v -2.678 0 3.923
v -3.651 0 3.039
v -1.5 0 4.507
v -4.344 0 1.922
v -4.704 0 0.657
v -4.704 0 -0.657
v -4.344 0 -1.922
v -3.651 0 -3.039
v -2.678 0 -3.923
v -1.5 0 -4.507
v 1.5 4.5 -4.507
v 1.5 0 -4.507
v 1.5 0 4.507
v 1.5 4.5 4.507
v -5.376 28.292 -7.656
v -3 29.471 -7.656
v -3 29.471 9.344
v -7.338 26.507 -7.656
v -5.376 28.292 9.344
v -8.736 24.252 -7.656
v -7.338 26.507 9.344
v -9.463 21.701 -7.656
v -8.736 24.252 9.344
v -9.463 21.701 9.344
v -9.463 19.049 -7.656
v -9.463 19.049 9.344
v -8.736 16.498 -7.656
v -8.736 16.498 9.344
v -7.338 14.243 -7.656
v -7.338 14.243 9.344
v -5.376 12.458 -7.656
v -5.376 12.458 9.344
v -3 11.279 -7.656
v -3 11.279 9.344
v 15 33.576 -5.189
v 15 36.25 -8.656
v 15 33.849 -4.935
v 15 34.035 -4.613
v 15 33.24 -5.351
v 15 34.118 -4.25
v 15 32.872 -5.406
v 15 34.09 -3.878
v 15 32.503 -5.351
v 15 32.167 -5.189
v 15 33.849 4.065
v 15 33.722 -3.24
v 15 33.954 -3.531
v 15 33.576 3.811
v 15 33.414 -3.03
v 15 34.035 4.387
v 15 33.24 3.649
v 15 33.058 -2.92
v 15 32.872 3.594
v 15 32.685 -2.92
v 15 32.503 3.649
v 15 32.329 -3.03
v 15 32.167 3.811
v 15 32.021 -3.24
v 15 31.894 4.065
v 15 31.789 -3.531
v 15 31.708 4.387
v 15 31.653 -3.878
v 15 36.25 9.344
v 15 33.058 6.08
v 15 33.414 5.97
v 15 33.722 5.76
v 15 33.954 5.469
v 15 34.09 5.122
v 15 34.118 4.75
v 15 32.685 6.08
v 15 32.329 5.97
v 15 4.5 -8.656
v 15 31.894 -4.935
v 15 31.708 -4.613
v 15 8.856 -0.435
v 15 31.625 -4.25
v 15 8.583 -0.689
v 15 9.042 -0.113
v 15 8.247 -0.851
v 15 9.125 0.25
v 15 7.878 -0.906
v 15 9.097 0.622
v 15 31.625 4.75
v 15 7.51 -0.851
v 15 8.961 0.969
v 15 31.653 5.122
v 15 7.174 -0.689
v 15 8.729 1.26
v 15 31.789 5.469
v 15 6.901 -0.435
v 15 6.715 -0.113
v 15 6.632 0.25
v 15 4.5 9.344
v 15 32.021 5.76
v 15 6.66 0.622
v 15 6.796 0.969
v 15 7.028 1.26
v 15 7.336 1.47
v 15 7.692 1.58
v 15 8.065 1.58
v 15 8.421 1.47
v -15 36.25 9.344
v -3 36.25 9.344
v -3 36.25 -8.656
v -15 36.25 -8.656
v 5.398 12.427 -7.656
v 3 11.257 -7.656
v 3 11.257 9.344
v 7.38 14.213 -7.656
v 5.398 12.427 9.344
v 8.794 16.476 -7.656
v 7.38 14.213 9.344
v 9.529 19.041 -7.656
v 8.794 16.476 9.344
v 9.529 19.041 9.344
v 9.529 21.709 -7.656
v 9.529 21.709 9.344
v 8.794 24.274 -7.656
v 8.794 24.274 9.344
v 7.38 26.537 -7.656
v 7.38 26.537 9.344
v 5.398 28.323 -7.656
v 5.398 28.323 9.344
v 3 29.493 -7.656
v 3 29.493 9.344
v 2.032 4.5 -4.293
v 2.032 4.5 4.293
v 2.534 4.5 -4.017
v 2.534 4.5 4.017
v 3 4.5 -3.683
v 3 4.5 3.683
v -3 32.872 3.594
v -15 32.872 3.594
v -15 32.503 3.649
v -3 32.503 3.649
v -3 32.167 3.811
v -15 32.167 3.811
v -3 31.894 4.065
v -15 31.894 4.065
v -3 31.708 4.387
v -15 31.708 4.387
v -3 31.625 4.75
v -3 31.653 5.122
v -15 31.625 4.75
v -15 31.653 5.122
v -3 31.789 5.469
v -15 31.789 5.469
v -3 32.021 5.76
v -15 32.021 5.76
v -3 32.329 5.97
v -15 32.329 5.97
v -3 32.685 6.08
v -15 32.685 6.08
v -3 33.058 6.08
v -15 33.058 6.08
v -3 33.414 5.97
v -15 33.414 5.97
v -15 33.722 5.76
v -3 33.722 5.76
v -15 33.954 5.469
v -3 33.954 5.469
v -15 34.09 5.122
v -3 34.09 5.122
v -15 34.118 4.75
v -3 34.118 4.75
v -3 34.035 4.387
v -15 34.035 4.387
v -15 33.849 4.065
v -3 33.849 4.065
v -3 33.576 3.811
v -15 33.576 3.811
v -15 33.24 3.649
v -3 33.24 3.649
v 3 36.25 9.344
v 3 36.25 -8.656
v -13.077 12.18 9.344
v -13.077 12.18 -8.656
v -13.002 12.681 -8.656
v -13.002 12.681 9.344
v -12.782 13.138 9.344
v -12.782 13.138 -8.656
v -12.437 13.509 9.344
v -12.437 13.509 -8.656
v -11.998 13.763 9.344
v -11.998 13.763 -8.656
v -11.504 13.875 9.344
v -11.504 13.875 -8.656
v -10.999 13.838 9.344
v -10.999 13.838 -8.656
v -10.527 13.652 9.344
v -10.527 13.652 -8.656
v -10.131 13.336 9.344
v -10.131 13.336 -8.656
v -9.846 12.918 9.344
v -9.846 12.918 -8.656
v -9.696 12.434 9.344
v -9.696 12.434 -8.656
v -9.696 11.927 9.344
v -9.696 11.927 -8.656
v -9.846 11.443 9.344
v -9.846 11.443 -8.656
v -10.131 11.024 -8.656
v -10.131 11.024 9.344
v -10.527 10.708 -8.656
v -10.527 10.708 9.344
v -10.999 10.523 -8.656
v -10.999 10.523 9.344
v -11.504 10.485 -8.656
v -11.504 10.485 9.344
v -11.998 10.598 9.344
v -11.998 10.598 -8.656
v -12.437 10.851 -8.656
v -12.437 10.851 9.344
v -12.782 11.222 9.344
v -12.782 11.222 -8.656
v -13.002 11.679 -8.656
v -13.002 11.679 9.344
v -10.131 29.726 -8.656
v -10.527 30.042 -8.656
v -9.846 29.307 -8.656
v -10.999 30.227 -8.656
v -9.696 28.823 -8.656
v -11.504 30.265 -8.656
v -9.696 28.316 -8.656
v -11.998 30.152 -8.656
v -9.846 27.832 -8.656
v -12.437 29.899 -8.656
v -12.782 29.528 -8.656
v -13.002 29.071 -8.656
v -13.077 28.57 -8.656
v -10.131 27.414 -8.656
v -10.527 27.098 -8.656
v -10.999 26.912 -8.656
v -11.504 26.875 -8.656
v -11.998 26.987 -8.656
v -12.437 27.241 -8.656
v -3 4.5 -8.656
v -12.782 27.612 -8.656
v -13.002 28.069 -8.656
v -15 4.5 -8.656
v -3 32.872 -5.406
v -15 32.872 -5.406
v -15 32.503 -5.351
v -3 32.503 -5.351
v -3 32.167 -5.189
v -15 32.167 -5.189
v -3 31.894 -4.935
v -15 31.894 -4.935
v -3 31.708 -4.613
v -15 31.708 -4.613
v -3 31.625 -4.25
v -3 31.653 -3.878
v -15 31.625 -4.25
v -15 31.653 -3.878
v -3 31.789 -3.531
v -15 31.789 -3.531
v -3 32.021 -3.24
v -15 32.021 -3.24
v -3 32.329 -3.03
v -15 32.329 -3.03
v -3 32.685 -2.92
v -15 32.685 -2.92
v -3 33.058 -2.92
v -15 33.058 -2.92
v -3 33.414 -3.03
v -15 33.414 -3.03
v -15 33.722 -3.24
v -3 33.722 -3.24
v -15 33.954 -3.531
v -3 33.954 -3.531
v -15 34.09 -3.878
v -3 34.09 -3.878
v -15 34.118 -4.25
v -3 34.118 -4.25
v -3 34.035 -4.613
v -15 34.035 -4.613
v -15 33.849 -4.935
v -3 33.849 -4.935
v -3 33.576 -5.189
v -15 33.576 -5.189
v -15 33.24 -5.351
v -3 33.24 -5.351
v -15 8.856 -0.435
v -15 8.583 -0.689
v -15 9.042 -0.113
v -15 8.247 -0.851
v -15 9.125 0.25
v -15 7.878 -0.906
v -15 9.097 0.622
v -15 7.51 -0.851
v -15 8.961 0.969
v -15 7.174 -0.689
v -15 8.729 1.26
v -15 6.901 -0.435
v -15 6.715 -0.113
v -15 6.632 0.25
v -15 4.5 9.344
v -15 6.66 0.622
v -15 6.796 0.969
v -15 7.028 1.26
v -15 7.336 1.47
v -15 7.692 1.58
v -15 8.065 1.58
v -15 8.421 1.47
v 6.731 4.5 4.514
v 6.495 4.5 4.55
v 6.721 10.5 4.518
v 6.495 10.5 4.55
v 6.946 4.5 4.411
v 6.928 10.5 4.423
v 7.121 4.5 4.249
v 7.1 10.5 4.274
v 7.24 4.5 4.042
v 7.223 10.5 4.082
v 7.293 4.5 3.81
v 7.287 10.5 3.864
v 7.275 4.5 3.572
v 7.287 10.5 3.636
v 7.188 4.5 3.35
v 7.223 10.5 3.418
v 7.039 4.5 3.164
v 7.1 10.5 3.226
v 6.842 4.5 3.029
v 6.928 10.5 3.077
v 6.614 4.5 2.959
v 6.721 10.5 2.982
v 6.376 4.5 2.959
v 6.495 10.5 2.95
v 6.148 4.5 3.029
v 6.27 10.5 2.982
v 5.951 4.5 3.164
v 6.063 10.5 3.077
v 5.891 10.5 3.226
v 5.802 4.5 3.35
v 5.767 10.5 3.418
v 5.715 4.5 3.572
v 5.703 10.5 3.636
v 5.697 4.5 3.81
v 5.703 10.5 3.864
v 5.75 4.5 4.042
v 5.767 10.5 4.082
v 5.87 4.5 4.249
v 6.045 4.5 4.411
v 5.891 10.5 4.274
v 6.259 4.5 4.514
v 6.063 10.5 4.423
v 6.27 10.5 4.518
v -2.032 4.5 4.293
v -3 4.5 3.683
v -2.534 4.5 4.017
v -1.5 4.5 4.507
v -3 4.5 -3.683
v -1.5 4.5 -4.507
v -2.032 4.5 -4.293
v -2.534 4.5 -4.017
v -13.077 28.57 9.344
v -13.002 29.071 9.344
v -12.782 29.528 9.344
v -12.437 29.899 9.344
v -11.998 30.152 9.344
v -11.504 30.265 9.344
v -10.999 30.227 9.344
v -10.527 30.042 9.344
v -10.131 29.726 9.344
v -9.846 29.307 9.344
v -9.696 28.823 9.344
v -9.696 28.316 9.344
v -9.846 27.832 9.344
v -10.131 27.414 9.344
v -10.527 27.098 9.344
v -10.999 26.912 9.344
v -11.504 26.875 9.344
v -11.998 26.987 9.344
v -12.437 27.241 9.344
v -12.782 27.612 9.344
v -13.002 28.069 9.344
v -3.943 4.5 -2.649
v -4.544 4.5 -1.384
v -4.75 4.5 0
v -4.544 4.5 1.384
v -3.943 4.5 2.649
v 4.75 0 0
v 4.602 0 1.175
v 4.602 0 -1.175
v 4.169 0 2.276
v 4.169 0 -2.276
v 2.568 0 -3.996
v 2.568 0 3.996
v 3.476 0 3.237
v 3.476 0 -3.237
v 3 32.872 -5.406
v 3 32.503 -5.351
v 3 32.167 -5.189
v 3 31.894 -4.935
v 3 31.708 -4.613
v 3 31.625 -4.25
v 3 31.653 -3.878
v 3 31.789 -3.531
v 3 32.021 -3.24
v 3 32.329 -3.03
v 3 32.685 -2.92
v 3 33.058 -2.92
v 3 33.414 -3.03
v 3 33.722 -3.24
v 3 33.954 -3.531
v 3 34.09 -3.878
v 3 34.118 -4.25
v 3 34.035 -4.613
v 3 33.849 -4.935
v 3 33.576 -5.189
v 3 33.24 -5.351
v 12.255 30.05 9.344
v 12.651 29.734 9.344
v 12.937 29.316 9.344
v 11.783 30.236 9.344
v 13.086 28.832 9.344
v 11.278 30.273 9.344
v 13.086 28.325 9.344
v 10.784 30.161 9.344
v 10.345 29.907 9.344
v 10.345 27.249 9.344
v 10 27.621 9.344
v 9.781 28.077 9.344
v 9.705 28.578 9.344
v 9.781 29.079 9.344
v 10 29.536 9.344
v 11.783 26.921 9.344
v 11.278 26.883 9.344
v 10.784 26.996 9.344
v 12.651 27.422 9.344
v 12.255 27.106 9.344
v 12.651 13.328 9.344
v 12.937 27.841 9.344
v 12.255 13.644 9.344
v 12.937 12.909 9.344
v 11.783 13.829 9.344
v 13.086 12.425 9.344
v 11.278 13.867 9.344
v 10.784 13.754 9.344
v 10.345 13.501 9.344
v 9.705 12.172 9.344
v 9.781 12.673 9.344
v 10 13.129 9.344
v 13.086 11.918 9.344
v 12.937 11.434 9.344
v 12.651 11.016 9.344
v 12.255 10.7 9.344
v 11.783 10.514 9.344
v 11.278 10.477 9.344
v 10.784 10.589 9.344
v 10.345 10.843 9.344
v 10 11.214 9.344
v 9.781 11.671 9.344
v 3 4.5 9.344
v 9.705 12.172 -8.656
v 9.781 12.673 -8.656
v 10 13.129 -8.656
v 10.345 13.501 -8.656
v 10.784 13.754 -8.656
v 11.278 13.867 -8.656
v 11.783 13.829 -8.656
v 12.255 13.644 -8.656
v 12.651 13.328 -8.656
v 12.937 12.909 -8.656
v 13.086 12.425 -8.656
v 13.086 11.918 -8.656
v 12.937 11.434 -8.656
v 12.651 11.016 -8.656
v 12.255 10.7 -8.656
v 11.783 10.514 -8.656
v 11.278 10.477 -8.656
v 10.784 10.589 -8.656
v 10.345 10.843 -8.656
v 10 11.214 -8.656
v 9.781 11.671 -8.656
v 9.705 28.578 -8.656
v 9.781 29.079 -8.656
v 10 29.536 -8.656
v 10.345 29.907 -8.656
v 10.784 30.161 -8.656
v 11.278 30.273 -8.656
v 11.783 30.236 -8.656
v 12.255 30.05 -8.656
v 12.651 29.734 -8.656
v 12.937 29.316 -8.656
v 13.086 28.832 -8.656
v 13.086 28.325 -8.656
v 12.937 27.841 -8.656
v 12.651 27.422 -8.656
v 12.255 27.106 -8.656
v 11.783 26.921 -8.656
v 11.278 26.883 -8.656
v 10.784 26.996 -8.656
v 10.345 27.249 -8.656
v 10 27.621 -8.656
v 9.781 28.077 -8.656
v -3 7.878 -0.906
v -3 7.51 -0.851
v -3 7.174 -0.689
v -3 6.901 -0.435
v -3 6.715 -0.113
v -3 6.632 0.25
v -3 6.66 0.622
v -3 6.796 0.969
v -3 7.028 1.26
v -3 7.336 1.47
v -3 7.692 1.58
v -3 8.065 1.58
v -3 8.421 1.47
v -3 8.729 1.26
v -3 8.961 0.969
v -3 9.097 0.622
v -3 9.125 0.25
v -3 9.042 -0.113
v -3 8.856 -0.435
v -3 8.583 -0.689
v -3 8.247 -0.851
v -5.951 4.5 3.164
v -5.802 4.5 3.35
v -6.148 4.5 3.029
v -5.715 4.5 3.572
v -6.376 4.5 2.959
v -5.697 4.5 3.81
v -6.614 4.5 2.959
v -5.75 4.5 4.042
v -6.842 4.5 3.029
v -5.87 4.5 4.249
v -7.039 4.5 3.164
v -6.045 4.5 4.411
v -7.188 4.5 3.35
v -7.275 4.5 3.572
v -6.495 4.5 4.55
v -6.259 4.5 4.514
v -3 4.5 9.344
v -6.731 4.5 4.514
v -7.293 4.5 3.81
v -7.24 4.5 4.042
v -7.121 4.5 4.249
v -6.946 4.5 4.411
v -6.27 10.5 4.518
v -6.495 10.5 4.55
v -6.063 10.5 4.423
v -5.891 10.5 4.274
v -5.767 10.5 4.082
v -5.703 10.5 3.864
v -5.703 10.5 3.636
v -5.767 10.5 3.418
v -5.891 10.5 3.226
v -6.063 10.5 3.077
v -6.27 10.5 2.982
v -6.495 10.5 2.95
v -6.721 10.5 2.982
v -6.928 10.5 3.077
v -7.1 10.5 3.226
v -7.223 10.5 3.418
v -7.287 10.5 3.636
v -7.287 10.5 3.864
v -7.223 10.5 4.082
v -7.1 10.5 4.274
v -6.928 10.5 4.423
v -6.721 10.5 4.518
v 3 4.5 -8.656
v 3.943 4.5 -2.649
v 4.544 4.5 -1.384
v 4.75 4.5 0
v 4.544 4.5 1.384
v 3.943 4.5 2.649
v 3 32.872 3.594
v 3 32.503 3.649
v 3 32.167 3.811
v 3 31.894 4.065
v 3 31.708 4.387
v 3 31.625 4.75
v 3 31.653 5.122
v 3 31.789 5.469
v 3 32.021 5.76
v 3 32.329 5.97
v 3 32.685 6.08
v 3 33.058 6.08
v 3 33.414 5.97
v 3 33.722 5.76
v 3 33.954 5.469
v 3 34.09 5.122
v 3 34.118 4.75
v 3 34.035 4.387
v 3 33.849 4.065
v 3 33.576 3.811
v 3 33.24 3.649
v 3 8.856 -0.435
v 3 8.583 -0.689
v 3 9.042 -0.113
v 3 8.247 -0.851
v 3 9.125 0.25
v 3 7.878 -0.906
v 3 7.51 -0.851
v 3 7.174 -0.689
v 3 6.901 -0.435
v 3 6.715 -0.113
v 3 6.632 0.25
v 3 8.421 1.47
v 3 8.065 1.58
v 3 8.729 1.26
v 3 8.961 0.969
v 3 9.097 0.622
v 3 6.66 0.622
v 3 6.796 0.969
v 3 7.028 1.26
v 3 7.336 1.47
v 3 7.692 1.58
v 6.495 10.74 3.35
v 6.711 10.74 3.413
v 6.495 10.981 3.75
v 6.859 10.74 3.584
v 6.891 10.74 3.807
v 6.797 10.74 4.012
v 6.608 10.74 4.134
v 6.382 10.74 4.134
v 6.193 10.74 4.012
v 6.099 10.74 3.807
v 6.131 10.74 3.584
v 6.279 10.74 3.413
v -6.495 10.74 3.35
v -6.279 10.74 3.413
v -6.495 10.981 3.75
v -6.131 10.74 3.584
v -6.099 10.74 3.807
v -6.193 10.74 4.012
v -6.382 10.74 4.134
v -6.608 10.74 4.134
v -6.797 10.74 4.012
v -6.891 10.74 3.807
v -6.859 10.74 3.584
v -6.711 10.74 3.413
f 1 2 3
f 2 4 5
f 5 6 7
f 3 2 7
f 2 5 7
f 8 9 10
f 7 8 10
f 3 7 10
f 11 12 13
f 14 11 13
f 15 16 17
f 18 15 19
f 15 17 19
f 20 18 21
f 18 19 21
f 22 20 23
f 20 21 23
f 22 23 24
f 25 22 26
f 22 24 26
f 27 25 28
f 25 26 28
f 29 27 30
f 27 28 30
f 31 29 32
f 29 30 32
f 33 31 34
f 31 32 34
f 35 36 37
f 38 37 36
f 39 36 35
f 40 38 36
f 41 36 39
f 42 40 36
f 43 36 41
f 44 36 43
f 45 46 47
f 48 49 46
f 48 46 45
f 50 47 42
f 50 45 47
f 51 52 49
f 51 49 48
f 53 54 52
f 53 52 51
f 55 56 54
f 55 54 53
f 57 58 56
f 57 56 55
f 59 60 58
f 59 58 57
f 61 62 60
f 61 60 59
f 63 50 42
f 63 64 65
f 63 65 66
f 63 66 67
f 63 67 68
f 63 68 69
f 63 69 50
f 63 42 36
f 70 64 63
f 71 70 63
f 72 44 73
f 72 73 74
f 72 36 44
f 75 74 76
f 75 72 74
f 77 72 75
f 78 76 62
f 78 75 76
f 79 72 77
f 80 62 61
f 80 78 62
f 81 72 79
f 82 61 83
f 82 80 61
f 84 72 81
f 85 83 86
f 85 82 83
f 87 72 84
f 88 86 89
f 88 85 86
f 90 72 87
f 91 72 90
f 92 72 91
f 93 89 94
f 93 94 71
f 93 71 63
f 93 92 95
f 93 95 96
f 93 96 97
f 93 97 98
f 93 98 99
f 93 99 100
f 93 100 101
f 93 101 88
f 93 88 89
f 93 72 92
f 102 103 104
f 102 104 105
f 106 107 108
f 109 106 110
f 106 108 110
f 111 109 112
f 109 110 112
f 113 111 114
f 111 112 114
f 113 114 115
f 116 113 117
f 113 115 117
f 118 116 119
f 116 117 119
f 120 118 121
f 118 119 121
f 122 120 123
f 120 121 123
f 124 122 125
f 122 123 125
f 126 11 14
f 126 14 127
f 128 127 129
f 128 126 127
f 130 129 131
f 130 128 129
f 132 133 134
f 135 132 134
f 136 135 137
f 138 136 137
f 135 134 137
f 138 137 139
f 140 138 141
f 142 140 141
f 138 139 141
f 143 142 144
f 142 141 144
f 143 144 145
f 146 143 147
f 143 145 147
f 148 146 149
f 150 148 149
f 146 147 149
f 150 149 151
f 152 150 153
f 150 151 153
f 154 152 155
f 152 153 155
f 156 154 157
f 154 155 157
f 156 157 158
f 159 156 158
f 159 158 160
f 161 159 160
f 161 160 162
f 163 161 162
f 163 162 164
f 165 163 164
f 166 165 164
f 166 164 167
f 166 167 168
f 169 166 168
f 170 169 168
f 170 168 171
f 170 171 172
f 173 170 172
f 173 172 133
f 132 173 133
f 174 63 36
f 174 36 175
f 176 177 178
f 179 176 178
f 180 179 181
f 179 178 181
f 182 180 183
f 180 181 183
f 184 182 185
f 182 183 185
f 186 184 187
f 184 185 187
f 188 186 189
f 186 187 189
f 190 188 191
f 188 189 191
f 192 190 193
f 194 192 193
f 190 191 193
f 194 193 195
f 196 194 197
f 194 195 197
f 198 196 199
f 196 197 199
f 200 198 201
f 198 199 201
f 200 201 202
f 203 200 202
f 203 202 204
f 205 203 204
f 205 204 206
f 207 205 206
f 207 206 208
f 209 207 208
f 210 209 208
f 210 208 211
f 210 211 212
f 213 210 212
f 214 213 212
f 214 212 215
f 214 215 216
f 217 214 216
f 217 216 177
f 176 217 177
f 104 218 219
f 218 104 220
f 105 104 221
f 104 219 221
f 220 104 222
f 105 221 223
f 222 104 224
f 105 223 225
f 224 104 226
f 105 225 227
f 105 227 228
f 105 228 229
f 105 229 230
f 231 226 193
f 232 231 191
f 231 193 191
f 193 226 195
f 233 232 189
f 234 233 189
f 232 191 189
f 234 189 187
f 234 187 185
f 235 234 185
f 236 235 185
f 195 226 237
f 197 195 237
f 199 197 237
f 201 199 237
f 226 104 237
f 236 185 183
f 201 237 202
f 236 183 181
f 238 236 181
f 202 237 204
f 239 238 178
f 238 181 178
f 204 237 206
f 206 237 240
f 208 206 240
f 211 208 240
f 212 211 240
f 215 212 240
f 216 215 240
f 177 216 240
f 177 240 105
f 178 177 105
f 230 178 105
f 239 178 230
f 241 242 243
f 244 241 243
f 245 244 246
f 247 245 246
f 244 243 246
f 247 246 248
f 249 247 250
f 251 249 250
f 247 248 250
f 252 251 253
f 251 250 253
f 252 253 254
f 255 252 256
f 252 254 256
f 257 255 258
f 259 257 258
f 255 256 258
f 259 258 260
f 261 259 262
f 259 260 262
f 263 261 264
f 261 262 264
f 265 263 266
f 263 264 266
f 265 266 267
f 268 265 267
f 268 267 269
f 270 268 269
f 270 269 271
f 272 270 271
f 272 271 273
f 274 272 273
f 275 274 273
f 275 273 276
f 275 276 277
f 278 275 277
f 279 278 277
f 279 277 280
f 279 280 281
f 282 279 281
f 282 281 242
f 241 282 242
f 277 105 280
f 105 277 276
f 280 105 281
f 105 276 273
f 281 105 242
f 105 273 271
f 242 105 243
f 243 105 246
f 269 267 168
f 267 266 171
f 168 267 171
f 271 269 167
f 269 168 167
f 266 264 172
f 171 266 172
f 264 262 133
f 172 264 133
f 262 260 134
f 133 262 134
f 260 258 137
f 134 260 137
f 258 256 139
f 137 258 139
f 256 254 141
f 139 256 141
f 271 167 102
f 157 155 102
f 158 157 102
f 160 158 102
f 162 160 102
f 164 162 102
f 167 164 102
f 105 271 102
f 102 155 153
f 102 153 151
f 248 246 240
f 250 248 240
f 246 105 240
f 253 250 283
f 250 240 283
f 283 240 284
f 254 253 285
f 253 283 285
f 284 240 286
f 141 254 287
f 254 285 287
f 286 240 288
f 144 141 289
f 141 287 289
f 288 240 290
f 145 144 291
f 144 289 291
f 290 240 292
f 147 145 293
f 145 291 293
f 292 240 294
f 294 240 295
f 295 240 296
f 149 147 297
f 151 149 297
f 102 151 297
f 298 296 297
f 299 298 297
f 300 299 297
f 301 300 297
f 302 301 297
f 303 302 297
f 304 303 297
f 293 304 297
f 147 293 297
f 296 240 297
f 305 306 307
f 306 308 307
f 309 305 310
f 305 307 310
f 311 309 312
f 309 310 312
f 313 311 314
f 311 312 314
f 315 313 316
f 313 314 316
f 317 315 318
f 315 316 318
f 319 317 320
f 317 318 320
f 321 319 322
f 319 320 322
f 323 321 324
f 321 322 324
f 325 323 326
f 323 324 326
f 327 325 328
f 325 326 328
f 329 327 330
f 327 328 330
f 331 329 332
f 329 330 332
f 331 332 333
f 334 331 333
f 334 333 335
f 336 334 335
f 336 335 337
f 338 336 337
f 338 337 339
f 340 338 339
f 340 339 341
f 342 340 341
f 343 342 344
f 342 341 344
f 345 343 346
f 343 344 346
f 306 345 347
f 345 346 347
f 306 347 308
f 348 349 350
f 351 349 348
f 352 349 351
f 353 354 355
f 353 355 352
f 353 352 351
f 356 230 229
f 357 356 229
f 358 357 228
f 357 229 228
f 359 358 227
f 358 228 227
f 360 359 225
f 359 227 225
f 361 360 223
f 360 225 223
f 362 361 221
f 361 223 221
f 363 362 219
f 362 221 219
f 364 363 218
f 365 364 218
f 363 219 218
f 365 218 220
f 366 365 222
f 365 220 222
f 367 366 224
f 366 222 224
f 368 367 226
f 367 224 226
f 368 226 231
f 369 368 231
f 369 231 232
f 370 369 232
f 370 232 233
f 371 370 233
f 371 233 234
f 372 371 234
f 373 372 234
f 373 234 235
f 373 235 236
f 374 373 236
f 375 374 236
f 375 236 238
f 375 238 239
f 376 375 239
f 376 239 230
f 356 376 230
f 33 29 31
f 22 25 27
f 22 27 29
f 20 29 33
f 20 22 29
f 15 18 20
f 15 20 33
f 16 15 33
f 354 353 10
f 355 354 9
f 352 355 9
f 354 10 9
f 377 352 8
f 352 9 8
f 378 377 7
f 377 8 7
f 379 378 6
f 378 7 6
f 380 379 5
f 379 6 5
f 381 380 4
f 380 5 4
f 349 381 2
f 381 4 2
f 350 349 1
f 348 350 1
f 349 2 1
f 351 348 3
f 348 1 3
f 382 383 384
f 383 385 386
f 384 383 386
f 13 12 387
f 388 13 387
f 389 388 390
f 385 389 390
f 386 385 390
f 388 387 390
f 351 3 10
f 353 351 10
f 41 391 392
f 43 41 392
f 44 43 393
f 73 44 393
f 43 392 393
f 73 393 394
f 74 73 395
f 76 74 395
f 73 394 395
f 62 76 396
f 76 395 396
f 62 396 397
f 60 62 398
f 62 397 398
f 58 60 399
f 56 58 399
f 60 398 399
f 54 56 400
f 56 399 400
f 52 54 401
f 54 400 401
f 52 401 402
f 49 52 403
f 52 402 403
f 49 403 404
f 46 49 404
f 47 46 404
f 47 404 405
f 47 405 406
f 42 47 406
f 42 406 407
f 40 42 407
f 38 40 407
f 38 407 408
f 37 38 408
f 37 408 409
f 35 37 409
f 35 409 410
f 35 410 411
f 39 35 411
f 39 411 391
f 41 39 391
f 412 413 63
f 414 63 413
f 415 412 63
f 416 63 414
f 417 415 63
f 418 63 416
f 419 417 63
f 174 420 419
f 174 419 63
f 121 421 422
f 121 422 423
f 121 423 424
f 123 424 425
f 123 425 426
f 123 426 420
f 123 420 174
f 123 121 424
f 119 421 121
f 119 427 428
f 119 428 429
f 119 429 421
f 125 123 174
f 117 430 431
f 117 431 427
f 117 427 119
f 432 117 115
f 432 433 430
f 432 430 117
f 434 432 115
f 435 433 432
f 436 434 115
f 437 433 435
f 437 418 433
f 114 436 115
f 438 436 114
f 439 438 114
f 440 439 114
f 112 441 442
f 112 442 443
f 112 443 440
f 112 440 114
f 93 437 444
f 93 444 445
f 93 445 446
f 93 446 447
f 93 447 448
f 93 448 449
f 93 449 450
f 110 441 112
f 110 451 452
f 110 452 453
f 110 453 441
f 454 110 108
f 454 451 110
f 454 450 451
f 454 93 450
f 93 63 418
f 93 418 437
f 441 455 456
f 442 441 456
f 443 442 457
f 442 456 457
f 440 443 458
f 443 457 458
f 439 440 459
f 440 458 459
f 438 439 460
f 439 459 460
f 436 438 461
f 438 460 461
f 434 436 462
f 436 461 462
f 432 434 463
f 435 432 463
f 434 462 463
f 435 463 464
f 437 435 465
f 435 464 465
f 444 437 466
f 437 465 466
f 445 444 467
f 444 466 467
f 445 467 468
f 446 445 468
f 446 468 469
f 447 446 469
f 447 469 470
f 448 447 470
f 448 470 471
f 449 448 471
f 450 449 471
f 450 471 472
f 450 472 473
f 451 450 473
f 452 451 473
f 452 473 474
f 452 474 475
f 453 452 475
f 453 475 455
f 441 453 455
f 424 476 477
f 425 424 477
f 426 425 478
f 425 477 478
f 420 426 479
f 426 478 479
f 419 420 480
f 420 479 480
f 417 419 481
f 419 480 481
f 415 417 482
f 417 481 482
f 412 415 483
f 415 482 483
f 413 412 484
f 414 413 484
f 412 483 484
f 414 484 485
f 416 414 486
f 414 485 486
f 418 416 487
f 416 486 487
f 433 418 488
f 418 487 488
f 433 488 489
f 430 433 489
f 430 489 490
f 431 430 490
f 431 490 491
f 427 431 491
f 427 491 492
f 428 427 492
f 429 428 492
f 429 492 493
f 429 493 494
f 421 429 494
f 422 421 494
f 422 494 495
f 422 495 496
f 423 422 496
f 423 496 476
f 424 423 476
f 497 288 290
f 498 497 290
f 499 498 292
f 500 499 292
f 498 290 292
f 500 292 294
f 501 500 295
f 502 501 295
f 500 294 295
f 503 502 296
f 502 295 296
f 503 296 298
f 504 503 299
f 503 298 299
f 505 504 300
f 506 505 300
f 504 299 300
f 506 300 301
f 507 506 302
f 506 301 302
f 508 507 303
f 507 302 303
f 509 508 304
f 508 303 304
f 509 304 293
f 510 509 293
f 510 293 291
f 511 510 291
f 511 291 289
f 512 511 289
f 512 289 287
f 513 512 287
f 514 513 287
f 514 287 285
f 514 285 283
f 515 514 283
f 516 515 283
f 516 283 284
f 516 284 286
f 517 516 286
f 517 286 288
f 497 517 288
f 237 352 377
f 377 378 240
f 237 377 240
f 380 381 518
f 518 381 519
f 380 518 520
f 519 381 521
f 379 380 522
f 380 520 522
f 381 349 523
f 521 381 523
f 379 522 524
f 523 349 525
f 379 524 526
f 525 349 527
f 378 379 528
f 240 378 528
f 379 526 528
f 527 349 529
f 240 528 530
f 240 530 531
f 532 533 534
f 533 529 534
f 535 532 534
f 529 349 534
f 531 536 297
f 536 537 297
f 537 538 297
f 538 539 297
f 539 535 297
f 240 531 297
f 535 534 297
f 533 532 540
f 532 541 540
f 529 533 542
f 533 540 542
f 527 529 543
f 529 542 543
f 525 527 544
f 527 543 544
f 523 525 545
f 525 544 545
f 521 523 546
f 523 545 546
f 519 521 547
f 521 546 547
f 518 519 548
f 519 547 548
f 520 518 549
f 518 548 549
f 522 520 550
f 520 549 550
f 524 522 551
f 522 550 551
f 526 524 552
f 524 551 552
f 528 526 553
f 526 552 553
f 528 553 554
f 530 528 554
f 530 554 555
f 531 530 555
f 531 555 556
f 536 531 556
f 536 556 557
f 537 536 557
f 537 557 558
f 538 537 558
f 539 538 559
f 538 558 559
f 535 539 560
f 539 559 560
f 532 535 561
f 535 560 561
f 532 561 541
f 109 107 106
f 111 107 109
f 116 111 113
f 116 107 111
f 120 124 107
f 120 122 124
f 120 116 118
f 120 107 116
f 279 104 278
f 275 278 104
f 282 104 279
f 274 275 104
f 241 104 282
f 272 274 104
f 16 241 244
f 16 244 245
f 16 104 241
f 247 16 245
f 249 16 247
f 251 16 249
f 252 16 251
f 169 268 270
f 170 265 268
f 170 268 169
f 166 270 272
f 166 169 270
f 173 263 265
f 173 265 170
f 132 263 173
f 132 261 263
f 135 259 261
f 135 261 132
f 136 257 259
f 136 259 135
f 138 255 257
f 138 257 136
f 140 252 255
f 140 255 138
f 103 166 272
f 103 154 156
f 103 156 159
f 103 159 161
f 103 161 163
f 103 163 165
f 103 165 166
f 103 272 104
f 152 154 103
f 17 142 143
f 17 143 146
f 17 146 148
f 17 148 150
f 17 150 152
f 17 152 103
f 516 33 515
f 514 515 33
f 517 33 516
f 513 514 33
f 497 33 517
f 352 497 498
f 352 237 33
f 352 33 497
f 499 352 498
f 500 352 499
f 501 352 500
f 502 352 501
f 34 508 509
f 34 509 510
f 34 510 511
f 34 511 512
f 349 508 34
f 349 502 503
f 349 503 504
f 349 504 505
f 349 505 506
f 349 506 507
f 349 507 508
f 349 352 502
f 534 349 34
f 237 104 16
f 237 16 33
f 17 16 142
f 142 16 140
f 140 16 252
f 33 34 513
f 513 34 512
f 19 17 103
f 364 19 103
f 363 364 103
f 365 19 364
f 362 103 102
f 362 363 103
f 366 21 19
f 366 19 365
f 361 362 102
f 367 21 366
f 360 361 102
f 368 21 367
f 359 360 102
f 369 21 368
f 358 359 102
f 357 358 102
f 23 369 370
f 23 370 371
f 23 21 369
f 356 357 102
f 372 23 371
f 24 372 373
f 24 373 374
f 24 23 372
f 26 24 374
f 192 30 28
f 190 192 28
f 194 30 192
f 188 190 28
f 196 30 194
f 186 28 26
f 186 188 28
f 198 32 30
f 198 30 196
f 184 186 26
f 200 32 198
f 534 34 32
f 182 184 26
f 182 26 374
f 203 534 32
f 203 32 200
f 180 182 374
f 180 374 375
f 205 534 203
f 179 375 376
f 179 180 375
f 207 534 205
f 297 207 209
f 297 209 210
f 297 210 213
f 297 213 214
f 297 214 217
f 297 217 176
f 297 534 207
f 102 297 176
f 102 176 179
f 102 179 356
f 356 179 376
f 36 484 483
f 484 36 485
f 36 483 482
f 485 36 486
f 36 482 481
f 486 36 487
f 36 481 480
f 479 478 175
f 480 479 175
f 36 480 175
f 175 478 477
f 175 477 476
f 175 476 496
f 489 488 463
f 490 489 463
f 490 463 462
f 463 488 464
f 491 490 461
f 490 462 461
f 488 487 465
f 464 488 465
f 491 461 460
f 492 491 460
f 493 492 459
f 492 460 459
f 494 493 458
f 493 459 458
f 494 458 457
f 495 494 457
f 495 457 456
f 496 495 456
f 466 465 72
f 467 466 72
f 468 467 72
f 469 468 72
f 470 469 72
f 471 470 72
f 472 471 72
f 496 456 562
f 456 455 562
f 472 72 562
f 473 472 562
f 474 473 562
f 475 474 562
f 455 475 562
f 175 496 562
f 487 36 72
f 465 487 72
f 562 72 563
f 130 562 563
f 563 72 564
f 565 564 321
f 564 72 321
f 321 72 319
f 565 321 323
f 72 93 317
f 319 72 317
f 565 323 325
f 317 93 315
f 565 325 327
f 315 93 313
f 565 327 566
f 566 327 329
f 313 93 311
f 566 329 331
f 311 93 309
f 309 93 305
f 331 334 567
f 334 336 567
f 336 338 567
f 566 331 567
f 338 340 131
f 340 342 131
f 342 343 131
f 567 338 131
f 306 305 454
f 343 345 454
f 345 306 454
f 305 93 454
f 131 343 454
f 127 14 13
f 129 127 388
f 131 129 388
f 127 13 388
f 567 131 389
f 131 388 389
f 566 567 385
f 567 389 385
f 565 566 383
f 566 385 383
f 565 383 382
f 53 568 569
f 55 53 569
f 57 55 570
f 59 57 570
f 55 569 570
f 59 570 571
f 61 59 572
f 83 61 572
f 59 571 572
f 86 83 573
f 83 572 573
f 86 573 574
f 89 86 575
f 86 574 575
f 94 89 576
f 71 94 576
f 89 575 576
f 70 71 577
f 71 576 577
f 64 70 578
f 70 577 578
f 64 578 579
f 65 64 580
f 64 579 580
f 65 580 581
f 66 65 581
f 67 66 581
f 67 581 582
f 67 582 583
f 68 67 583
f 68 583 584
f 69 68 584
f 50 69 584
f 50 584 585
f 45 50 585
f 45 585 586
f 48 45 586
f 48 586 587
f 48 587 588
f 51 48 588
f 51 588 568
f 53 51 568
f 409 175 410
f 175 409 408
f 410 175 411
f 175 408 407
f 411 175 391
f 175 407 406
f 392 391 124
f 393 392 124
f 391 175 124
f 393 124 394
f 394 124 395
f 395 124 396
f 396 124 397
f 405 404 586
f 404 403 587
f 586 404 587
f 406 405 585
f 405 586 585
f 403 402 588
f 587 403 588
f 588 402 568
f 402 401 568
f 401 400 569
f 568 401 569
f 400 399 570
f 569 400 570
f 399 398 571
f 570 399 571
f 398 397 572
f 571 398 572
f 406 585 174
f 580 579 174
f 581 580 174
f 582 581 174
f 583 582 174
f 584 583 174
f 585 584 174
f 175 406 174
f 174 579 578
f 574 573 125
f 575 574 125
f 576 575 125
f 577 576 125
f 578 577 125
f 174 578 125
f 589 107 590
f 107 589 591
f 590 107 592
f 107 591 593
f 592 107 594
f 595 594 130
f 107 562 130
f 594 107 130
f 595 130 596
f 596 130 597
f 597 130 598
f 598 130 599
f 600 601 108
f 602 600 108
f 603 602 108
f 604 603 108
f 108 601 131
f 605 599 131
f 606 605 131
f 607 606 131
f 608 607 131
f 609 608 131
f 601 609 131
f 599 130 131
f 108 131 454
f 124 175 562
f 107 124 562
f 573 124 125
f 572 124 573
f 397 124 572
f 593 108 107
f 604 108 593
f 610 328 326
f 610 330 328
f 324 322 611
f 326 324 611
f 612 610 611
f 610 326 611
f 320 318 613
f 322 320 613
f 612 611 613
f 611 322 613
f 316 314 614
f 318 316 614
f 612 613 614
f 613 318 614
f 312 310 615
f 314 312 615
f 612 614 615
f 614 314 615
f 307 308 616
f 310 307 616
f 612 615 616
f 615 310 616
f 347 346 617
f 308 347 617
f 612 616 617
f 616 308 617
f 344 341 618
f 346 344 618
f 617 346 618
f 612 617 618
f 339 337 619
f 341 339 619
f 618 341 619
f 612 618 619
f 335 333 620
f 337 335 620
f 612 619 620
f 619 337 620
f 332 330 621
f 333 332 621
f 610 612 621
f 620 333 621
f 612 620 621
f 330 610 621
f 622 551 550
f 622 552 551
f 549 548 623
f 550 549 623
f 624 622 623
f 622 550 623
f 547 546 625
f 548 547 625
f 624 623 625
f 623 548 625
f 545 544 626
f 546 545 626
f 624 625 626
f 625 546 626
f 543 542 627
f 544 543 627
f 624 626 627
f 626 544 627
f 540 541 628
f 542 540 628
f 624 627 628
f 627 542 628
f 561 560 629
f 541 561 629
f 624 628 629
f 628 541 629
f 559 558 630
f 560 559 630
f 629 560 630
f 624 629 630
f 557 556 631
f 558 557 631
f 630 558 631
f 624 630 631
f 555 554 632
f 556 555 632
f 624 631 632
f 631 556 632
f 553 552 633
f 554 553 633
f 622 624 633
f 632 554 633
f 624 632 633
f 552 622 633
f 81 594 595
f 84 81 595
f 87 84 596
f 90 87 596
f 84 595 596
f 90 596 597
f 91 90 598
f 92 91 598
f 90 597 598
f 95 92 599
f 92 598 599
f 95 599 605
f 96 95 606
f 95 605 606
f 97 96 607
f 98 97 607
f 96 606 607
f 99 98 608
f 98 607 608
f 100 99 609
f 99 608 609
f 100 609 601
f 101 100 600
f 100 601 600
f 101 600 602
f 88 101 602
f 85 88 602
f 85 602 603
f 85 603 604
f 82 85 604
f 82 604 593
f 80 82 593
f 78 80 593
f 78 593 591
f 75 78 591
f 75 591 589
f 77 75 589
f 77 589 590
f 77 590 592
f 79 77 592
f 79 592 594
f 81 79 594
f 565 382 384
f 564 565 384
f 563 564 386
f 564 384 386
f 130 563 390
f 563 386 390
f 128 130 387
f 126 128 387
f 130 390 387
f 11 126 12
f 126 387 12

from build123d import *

# Parameters (mm, degrees)
SKETCH2_W                 = 12
SKETCH2_H                 = 18
EXTRUDE1_DEPTH            = 31.75
EXTRUDE1_2_DEPTH          = 31.75
EXTRUDE2_DEPTH            = 4.5
SKETCH4_R                 = 9.5885
EXTRUDE3_DEPTH            = 17
M3_CLEARANCE_HOLE1_D      = 3.4
M3X0_5_TAPPED_HOLE1_D     = 2.5
M2X0_4_TAPPED_HOLE2_D     = 1.6
M2X0_4_TAPPED_HOLE2_DEPTH = 6
M2X0_4_TAPPED_HOLE2_TIP   = 0.480688495


with BuildPart() as part:
    # Sketch2 → Extrude1 (new body)
    with BuildSketch(Plane(origin=(0, 4.5, 0), x_dir=(-1, 0, 0), z_dir=(0, 1, 0))):
        with Locations((9, 0.343878918)):
            Rectangle(SKETCH2_W, SKETCH2_H)
    extrude(amount=EXTRUDE1_DEPTH)



with BuildPart() as body_2:
    # Sketch2 → Extrude1 2 (new body)
    with BuildSketch(Plane(origin=(0, 4.5, 0), x_dir=(-1, 0, 0), z_dir=(0, 1, 0))):
        with Locations((-9, 0.343878918)):
            Rectangle(SKETCH2_W, SKETCH2_H)
    extrude(amount=EXTRUDE1_2_DEPTH)


with BuildPart() as part_1:
    add(part.part)

    add(body_2.part)  # Extrude2 merges body 2
    # Sketch1 → Extrude2 (add)
    with BuildSketch(Plane(origin=(0, 0, 0), x_dir=(1, 0, 0), z_dir=(0, 1, 0))):
        with BuildLine():
            ThreePointArc((4.75, 0), (3.852758752, 2.778263846), (1.5, 4.506939094))
            Line((1.5, 4.506939094), (1.5, -4.506939094))
            ThreePointArc((1.5, -4.506939094), (3.852758752, -2.778263846), (4.75, 0))
        make_face()
        with BuildLine():
            Line((-1.5, -4.506939094), (-1.5, 4.506939094))
            ThreePointArc((-1.5, 4.506939094), (-4.75, 0), (-1.5, -4.506939094))
        make_face()
    extrude(amount=EXTRUDE2_DEPTH)

    # Sketch4 → Extrude3 (cut)
    with BuildSketch(Plane.XY.offset(9.343878918)):
        with Locations((0.033766691, 20.375)):
            Circle(SKETCH4_R)
    extrude(amount=-EXTRUDE3_DEPTH, mode=Mode.SUBTRACT)

    # M3 Clearance Hole1 (through all)
    with Locations(Plane(origin=(-11.377218639, 28.569859147, 9.343878918), x_dir=(1, 0, 0), z_dir=(0, 0, 1))):
        with Locations((0, 0), (0, -16.389718294), (22.782225349, -16.398024537), (22.782225349, 0.008306243)):
            Hole(M3_CLEARANCE_HOLE1_D / 2)

    # M3x0.5 Tapped Hole1 (through all)
    with Locations(Plane(origin=(15, 32.871578641, 4.843878918), x_dir=(0, 0, 1), z_dir=(1, 0, 0))):
        with Locations((0, 0), (-9, 0), (-4.5, 24.993157282)):
            Hole(M3X0_5_TAPPED_HOLE1_D / 2)

    # M2x0.4 Tapped Hole2
    with Locations(Plane(origin=(-6.495190528, 4.5, 3.75), x_dir=(0, 0, -1), z_dir=(0, -1, 0))):
        with Locations((0, 0), (0, 12.990381056)):
            Hole(M2X0_4_TAPPED_HOLE2_D / 2, depth=M2X0_4_TAPPED_HOLE2_DEPTH)
            with Locations((0, 0, -(M2X0_4_TAPPED_HOLE2_DEPTH + M2X0_4_TAPPED_HOLE2_TIP / 2))):  # 118° drill point
                Cone(0, M2X0_4_TAPPED_HOLE2_D / 2, M2X0_4_TAPPED_HOLE2_TIP, mode=Mode.SUBTRACT)


solid = part_1.part
